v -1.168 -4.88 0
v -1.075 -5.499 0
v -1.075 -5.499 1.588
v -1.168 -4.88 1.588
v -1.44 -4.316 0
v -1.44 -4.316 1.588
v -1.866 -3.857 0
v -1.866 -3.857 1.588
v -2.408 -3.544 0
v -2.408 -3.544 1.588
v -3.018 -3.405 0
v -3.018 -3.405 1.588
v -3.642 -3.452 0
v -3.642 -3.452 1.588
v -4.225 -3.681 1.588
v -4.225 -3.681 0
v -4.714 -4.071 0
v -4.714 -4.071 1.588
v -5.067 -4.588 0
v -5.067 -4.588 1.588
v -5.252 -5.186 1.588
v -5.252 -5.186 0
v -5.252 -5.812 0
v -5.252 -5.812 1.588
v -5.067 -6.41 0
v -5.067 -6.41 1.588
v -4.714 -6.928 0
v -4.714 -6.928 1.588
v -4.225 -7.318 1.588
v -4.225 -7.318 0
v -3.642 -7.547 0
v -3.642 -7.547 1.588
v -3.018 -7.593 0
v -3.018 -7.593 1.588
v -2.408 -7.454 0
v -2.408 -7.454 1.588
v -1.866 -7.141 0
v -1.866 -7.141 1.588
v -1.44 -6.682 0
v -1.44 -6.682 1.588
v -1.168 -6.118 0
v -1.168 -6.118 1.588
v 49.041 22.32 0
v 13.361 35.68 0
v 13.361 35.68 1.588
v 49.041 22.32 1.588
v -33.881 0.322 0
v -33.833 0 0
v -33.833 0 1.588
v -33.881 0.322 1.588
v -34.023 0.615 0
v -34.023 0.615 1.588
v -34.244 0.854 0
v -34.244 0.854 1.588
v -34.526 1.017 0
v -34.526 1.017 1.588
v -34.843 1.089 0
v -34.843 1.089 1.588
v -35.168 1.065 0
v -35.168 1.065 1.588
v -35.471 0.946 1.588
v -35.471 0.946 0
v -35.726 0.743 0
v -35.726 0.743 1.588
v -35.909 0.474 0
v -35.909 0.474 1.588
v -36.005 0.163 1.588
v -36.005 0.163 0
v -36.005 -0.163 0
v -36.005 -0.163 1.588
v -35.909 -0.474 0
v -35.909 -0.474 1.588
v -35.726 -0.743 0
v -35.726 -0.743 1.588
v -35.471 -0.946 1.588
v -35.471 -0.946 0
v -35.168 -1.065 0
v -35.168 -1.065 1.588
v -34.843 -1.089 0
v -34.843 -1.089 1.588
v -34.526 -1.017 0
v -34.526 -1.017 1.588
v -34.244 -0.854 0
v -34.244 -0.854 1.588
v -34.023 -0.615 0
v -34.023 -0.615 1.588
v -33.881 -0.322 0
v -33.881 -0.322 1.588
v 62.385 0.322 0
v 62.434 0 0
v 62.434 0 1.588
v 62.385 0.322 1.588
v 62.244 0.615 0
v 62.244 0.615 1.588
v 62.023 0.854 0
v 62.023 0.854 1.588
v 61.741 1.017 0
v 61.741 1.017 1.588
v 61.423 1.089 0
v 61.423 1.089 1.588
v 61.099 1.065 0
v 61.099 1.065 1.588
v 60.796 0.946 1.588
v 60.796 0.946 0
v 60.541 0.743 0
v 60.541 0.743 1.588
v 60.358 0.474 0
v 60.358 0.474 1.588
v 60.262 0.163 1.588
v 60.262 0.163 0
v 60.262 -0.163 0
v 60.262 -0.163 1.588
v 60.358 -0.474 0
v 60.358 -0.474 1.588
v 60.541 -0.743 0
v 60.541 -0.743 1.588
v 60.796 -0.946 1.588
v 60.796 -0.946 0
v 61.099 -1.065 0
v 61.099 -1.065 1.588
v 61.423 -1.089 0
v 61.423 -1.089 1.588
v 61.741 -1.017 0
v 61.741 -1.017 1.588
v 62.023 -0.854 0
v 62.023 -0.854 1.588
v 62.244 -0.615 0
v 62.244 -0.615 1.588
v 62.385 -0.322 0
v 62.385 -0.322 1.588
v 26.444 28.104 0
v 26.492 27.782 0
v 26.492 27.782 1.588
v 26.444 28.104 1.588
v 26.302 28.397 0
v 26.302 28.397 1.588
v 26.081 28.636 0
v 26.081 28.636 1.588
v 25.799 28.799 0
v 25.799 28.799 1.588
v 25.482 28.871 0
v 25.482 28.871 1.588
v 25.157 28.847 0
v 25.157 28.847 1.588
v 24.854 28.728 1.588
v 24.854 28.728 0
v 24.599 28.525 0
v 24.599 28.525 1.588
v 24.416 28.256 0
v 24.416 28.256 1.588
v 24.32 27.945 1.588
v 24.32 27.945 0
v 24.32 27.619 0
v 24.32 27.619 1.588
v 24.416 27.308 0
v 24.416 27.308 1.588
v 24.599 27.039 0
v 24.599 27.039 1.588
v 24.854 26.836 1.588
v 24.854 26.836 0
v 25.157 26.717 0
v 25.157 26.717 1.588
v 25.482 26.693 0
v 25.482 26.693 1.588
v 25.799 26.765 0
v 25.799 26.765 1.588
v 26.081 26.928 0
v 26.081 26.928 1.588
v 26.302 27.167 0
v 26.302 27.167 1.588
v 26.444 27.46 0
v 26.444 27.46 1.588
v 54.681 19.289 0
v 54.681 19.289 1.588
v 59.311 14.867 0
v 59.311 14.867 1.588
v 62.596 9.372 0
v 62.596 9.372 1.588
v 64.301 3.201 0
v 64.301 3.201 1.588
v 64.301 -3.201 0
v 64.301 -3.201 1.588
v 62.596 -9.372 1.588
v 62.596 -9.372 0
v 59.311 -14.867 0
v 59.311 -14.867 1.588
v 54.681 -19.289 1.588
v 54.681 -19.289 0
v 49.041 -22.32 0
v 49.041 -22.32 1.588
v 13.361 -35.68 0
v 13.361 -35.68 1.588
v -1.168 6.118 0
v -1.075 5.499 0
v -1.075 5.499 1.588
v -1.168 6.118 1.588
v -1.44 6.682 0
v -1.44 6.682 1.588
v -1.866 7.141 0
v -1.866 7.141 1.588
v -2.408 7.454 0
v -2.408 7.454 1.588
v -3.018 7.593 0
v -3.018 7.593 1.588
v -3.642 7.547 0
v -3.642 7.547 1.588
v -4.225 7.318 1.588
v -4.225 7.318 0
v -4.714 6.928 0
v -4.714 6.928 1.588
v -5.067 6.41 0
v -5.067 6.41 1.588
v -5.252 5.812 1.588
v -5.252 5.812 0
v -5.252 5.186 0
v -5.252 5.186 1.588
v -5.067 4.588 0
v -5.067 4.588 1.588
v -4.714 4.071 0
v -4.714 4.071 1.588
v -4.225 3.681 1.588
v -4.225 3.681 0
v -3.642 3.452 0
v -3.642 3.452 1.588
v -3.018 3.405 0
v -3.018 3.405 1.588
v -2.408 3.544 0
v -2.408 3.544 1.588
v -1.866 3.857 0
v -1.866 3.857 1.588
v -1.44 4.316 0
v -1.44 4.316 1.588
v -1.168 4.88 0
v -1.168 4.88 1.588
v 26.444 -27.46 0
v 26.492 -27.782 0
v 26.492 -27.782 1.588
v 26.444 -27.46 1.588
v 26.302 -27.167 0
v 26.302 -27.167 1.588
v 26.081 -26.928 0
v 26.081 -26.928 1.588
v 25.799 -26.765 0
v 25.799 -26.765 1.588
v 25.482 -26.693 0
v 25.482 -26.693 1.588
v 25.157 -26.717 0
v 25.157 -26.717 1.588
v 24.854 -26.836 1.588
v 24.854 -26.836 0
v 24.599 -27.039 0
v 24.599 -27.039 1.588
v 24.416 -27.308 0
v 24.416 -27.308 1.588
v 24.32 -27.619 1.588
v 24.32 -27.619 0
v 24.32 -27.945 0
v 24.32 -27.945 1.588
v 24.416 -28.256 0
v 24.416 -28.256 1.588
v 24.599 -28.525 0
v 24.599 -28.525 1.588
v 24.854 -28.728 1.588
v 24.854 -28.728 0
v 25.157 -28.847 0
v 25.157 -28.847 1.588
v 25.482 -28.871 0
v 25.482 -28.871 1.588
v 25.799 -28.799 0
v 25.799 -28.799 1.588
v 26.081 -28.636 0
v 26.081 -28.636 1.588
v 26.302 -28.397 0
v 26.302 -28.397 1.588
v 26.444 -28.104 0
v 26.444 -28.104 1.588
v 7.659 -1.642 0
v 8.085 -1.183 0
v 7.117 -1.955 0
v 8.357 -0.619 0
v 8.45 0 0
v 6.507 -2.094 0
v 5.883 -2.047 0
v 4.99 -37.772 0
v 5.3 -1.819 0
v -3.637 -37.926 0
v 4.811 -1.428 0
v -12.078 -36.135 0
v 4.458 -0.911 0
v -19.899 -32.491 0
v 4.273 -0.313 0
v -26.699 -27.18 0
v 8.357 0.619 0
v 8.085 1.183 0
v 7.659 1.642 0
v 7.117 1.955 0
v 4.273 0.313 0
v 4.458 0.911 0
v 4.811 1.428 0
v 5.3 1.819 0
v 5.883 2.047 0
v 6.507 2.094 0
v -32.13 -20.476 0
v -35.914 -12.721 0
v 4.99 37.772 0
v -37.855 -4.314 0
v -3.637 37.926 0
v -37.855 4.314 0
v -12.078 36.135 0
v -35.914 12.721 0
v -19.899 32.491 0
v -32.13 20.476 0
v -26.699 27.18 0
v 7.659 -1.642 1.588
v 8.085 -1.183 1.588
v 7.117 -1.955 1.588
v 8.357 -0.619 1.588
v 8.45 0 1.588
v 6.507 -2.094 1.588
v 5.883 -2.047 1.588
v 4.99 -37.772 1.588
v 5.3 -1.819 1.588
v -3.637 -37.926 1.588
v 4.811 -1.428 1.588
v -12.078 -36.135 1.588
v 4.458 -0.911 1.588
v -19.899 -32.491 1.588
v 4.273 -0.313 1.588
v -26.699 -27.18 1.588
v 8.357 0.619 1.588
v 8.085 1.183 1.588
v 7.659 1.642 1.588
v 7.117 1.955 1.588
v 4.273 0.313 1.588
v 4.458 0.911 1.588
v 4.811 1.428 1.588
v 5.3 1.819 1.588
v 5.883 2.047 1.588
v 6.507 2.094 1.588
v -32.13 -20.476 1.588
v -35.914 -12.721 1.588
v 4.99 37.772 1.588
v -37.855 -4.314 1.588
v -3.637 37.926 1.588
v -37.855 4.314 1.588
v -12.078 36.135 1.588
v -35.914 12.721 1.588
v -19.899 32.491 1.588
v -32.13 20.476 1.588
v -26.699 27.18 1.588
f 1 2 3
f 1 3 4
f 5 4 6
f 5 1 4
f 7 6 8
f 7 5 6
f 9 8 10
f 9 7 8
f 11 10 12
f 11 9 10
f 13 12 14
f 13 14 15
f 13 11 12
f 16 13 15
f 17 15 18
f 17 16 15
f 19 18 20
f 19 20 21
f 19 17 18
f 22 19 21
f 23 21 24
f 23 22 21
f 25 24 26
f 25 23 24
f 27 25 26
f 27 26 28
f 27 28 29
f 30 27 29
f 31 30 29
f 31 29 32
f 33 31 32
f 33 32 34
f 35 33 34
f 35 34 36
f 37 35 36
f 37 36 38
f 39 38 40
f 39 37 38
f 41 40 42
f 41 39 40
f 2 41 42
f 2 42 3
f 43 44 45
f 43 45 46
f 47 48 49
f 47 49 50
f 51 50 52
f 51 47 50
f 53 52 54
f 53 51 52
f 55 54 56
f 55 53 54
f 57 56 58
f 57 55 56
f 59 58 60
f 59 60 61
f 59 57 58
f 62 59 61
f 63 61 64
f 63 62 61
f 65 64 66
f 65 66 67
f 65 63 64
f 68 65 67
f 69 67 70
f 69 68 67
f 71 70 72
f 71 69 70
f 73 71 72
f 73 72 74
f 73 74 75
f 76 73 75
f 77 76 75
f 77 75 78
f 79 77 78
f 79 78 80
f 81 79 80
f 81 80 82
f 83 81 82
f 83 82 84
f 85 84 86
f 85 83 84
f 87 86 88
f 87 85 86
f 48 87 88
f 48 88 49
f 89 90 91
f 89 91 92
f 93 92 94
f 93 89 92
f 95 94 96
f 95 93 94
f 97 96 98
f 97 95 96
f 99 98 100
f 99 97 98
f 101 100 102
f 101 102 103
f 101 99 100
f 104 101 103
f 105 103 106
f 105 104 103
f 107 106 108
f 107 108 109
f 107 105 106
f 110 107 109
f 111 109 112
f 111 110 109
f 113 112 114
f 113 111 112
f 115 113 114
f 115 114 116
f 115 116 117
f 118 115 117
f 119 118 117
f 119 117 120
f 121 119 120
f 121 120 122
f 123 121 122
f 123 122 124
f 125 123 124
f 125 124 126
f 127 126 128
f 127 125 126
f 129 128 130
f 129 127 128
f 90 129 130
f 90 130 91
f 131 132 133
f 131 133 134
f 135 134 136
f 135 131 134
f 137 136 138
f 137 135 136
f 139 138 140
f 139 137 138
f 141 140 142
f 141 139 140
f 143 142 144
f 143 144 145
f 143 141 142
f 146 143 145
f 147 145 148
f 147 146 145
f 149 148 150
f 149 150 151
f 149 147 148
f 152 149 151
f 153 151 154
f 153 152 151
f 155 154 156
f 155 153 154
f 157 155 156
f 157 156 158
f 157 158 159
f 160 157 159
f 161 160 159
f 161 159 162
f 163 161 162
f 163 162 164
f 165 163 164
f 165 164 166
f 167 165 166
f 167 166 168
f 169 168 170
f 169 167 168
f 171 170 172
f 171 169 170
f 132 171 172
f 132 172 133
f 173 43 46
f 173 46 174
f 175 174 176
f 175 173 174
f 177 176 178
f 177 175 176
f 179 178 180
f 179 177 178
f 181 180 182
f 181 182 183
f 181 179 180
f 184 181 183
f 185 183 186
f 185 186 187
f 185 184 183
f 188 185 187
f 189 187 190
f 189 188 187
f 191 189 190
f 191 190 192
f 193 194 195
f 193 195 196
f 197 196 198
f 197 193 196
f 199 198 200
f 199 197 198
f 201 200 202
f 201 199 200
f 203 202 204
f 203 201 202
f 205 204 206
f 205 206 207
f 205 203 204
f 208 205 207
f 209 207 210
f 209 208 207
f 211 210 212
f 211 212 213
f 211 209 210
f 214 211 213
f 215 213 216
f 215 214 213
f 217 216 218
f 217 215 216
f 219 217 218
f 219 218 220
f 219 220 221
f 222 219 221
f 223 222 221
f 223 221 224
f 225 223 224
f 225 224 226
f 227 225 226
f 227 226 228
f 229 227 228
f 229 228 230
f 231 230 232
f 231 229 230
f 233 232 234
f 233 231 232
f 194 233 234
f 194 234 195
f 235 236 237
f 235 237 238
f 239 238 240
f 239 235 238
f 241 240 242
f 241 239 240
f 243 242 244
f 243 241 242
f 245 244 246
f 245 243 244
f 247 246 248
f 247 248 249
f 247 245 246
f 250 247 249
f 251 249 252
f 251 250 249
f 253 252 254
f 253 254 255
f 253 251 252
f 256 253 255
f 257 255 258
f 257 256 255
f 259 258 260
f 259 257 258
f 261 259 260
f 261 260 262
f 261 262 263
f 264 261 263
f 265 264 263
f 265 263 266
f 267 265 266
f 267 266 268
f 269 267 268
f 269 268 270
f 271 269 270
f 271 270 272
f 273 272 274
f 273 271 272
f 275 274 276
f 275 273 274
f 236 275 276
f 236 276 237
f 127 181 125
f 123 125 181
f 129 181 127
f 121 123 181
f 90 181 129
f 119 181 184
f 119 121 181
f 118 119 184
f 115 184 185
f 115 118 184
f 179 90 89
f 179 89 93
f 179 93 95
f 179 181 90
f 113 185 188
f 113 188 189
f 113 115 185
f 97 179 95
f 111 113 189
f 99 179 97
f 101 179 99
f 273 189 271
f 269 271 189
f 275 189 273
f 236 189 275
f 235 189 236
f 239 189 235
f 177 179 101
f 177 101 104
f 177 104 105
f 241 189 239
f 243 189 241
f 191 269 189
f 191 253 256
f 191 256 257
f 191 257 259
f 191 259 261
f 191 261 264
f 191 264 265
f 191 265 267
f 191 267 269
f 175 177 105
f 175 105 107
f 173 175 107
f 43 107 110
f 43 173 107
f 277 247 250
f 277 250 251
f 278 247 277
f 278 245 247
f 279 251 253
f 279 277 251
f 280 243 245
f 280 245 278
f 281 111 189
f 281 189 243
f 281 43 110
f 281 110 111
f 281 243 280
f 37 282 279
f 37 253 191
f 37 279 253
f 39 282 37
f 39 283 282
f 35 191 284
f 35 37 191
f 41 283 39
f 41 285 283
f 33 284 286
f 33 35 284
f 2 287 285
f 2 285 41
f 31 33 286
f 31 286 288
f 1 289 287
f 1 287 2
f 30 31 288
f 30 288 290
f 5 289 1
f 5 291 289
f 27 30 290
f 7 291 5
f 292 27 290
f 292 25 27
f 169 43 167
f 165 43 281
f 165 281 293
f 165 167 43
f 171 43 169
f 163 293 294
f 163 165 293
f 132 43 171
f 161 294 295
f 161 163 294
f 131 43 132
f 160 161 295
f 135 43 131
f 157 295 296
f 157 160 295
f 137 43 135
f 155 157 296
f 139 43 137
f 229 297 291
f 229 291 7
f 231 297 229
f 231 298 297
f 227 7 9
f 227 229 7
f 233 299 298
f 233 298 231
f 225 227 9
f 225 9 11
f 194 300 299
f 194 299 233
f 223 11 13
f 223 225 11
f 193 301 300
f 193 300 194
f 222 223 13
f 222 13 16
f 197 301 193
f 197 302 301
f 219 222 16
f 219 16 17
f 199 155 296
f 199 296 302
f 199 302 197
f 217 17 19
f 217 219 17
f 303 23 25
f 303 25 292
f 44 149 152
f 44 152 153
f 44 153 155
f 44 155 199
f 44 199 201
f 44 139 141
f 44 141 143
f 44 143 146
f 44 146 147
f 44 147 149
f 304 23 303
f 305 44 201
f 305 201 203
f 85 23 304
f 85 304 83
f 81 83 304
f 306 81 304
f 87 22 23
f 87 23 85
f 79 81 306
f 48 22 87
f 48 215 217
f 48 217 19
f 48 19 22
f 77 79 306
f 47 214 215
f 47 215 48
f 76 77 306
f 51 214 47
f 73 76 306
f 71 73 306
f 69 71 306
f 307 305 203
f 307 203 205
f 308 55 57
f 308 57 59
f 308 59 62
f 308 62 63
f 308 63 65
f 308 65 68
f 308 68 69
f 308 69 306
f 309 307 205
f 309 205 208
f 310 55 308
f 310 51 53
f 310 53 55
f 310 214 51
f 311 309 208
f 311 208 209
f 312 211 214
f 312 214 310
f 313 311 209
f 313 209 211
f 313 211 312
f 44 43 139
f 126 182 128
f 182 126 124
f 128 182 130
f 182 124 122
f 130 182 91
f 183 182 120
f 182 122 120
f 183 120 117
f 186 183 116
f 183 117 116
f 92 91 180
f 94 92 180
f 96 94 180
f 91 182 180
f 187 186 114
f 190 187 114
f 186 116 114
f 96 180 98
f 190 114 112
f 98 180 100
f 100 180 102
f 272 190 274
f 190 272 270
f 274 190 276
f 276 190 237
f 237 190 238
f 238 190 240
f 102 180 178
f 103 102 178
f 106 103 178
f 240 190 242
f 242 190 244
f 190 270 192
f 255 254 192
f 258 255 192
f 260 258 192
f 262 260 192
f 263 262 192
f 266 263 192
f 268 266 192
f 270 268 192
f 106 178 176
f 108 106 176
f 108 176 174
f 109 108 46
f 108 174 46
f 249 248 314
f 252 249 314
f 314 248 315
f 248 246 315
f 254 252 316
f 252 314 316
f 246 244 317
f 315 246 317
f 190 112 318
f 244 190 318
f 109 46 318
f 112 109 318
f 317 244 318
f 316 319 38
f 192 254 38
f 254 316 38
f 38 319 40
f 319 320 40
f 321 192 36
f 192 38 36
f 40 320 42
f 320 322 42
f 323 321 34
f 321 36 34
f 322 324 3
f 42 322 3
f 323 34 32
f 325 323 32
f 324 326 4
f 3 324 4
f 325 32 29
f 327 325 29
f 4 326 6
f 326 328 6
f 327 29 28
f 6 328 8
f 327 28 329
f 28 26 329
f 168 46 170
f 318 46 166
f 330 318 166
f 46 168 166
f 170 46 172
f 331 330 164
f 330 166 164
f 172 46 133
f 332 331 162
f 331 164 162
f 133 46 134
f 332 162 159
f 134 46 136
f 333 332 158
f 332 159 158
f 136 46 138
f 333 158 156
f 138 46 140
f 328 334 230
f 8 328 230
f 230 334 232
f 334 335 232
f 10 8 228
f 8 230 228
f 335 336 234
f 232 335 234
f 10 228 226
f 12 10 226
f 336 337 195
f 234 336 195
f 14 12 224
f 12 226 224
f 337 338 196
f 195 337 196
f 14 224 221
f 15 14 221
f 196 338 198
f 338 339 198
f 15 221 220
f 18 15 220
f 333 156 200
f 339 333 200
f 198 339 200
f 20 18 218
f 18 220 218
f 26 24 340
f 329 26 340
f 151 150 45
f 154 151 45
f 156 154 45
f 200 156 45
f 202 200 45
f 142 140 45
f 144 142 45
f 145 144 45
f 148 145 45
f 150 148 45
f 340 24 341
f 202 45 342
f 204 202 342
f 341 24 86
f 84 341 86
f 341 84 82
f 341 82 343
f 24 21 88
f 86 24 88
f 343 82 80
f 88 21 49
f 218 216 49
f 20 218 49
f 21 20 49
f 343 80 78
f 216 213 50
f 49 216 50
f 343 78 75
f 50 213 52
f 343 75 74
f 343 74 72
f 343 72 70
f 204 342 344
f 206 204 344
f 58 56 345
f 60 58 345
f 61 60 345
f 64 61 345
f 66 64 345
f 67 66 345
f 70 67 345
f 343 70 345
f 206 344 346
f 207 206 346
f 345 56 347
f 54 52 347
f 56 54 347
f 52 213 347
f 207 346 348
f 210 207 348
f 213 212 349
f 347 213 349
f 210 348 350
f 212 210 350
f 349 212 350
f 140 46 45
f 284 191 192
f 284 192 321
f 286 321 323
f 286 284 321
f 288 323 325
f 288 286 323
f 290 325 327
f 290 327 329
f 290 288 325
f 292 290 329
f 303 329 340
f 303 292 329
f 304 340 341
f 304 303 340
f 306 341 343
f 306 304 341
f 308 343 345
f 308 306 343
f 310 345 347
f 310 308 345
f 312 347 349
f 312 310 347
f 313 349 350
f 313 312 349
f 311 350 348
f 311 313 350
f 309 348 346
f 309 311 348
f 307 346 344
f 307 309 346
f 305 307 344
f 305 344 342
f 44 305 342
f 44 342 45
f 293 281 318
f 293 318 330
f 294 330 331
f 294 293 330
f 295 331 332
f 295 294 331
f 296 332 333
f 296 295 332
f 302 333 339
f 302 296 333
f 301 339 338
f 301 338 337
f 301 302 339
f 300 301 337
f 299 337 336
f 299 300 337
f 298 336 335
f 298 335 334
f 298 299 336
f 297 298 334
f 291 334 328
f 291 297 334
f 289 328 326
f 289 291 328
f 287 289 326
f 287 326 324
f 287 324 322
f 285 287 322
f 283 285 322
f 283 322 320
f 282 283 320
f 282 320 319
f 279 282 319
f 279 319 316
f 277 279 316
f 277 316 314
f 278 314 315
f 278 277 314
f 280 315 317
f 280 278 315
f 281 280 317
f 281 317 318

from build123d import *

# Parameters (mm, degrees)
SKETCH1_R           = 1.0922
SKETCH1_R_2         = 2.1
BOSS_EXTRUDE1_DEPTH = 1.5875


with BuildPart() as part:
    # Sketch1 → Boss-Extrude1 (new body)
    with BuildSketch(Plane.XY):
        with BuildLine():
            Line((13.360883802, 35.680481836), (49.041365638, 22.319598034))
            ThreePointArc((49.041365638, 22.319598034), (64.516692787, 0), (49.041365638, -22.319598034))
            Line((49.041365638, -22.319598034), (13.360883802, -35.680481836))
            ThreePointArc((13.360883802, -35.680481836), (-38.1, 0), (13.360883802, 35.680481836))
        make_face()
        with Locations((61.341692787, 0)):
            Circle(SKETCH1_R, mode=Mode.SUBTRACT)
        with Locations((25.4, 27.782025366)):
            Circle(SKETCH1_R, mode=Mode.SUBTRACT)
        with Locations((25.4, -27.782025366)):
            Circle(SKETCH1_R, mode=Mode.SUBTRACT)
        with Locations((-34.925, 0)):
            Circle(SKETCH1_R, mode=Mode.SUBTRACT)
        with Locations((6.35, 0)):
            Circle(SKETCH1_R_2, mode=Mode.SUBTRACT)
        with Locations((-3.175, -5.499261314)):
            Circle(SKETCH1_R_2, mode=Mode.SUBTRACT)
        with Locations((-3.175, 5.499261314)):
            Circle(SKETCH1_R_2, mode=Mode.SUBTRACT)
    extrude(amount=BOSS_EXTRUDE1_DEPTH)


solid = part.part
